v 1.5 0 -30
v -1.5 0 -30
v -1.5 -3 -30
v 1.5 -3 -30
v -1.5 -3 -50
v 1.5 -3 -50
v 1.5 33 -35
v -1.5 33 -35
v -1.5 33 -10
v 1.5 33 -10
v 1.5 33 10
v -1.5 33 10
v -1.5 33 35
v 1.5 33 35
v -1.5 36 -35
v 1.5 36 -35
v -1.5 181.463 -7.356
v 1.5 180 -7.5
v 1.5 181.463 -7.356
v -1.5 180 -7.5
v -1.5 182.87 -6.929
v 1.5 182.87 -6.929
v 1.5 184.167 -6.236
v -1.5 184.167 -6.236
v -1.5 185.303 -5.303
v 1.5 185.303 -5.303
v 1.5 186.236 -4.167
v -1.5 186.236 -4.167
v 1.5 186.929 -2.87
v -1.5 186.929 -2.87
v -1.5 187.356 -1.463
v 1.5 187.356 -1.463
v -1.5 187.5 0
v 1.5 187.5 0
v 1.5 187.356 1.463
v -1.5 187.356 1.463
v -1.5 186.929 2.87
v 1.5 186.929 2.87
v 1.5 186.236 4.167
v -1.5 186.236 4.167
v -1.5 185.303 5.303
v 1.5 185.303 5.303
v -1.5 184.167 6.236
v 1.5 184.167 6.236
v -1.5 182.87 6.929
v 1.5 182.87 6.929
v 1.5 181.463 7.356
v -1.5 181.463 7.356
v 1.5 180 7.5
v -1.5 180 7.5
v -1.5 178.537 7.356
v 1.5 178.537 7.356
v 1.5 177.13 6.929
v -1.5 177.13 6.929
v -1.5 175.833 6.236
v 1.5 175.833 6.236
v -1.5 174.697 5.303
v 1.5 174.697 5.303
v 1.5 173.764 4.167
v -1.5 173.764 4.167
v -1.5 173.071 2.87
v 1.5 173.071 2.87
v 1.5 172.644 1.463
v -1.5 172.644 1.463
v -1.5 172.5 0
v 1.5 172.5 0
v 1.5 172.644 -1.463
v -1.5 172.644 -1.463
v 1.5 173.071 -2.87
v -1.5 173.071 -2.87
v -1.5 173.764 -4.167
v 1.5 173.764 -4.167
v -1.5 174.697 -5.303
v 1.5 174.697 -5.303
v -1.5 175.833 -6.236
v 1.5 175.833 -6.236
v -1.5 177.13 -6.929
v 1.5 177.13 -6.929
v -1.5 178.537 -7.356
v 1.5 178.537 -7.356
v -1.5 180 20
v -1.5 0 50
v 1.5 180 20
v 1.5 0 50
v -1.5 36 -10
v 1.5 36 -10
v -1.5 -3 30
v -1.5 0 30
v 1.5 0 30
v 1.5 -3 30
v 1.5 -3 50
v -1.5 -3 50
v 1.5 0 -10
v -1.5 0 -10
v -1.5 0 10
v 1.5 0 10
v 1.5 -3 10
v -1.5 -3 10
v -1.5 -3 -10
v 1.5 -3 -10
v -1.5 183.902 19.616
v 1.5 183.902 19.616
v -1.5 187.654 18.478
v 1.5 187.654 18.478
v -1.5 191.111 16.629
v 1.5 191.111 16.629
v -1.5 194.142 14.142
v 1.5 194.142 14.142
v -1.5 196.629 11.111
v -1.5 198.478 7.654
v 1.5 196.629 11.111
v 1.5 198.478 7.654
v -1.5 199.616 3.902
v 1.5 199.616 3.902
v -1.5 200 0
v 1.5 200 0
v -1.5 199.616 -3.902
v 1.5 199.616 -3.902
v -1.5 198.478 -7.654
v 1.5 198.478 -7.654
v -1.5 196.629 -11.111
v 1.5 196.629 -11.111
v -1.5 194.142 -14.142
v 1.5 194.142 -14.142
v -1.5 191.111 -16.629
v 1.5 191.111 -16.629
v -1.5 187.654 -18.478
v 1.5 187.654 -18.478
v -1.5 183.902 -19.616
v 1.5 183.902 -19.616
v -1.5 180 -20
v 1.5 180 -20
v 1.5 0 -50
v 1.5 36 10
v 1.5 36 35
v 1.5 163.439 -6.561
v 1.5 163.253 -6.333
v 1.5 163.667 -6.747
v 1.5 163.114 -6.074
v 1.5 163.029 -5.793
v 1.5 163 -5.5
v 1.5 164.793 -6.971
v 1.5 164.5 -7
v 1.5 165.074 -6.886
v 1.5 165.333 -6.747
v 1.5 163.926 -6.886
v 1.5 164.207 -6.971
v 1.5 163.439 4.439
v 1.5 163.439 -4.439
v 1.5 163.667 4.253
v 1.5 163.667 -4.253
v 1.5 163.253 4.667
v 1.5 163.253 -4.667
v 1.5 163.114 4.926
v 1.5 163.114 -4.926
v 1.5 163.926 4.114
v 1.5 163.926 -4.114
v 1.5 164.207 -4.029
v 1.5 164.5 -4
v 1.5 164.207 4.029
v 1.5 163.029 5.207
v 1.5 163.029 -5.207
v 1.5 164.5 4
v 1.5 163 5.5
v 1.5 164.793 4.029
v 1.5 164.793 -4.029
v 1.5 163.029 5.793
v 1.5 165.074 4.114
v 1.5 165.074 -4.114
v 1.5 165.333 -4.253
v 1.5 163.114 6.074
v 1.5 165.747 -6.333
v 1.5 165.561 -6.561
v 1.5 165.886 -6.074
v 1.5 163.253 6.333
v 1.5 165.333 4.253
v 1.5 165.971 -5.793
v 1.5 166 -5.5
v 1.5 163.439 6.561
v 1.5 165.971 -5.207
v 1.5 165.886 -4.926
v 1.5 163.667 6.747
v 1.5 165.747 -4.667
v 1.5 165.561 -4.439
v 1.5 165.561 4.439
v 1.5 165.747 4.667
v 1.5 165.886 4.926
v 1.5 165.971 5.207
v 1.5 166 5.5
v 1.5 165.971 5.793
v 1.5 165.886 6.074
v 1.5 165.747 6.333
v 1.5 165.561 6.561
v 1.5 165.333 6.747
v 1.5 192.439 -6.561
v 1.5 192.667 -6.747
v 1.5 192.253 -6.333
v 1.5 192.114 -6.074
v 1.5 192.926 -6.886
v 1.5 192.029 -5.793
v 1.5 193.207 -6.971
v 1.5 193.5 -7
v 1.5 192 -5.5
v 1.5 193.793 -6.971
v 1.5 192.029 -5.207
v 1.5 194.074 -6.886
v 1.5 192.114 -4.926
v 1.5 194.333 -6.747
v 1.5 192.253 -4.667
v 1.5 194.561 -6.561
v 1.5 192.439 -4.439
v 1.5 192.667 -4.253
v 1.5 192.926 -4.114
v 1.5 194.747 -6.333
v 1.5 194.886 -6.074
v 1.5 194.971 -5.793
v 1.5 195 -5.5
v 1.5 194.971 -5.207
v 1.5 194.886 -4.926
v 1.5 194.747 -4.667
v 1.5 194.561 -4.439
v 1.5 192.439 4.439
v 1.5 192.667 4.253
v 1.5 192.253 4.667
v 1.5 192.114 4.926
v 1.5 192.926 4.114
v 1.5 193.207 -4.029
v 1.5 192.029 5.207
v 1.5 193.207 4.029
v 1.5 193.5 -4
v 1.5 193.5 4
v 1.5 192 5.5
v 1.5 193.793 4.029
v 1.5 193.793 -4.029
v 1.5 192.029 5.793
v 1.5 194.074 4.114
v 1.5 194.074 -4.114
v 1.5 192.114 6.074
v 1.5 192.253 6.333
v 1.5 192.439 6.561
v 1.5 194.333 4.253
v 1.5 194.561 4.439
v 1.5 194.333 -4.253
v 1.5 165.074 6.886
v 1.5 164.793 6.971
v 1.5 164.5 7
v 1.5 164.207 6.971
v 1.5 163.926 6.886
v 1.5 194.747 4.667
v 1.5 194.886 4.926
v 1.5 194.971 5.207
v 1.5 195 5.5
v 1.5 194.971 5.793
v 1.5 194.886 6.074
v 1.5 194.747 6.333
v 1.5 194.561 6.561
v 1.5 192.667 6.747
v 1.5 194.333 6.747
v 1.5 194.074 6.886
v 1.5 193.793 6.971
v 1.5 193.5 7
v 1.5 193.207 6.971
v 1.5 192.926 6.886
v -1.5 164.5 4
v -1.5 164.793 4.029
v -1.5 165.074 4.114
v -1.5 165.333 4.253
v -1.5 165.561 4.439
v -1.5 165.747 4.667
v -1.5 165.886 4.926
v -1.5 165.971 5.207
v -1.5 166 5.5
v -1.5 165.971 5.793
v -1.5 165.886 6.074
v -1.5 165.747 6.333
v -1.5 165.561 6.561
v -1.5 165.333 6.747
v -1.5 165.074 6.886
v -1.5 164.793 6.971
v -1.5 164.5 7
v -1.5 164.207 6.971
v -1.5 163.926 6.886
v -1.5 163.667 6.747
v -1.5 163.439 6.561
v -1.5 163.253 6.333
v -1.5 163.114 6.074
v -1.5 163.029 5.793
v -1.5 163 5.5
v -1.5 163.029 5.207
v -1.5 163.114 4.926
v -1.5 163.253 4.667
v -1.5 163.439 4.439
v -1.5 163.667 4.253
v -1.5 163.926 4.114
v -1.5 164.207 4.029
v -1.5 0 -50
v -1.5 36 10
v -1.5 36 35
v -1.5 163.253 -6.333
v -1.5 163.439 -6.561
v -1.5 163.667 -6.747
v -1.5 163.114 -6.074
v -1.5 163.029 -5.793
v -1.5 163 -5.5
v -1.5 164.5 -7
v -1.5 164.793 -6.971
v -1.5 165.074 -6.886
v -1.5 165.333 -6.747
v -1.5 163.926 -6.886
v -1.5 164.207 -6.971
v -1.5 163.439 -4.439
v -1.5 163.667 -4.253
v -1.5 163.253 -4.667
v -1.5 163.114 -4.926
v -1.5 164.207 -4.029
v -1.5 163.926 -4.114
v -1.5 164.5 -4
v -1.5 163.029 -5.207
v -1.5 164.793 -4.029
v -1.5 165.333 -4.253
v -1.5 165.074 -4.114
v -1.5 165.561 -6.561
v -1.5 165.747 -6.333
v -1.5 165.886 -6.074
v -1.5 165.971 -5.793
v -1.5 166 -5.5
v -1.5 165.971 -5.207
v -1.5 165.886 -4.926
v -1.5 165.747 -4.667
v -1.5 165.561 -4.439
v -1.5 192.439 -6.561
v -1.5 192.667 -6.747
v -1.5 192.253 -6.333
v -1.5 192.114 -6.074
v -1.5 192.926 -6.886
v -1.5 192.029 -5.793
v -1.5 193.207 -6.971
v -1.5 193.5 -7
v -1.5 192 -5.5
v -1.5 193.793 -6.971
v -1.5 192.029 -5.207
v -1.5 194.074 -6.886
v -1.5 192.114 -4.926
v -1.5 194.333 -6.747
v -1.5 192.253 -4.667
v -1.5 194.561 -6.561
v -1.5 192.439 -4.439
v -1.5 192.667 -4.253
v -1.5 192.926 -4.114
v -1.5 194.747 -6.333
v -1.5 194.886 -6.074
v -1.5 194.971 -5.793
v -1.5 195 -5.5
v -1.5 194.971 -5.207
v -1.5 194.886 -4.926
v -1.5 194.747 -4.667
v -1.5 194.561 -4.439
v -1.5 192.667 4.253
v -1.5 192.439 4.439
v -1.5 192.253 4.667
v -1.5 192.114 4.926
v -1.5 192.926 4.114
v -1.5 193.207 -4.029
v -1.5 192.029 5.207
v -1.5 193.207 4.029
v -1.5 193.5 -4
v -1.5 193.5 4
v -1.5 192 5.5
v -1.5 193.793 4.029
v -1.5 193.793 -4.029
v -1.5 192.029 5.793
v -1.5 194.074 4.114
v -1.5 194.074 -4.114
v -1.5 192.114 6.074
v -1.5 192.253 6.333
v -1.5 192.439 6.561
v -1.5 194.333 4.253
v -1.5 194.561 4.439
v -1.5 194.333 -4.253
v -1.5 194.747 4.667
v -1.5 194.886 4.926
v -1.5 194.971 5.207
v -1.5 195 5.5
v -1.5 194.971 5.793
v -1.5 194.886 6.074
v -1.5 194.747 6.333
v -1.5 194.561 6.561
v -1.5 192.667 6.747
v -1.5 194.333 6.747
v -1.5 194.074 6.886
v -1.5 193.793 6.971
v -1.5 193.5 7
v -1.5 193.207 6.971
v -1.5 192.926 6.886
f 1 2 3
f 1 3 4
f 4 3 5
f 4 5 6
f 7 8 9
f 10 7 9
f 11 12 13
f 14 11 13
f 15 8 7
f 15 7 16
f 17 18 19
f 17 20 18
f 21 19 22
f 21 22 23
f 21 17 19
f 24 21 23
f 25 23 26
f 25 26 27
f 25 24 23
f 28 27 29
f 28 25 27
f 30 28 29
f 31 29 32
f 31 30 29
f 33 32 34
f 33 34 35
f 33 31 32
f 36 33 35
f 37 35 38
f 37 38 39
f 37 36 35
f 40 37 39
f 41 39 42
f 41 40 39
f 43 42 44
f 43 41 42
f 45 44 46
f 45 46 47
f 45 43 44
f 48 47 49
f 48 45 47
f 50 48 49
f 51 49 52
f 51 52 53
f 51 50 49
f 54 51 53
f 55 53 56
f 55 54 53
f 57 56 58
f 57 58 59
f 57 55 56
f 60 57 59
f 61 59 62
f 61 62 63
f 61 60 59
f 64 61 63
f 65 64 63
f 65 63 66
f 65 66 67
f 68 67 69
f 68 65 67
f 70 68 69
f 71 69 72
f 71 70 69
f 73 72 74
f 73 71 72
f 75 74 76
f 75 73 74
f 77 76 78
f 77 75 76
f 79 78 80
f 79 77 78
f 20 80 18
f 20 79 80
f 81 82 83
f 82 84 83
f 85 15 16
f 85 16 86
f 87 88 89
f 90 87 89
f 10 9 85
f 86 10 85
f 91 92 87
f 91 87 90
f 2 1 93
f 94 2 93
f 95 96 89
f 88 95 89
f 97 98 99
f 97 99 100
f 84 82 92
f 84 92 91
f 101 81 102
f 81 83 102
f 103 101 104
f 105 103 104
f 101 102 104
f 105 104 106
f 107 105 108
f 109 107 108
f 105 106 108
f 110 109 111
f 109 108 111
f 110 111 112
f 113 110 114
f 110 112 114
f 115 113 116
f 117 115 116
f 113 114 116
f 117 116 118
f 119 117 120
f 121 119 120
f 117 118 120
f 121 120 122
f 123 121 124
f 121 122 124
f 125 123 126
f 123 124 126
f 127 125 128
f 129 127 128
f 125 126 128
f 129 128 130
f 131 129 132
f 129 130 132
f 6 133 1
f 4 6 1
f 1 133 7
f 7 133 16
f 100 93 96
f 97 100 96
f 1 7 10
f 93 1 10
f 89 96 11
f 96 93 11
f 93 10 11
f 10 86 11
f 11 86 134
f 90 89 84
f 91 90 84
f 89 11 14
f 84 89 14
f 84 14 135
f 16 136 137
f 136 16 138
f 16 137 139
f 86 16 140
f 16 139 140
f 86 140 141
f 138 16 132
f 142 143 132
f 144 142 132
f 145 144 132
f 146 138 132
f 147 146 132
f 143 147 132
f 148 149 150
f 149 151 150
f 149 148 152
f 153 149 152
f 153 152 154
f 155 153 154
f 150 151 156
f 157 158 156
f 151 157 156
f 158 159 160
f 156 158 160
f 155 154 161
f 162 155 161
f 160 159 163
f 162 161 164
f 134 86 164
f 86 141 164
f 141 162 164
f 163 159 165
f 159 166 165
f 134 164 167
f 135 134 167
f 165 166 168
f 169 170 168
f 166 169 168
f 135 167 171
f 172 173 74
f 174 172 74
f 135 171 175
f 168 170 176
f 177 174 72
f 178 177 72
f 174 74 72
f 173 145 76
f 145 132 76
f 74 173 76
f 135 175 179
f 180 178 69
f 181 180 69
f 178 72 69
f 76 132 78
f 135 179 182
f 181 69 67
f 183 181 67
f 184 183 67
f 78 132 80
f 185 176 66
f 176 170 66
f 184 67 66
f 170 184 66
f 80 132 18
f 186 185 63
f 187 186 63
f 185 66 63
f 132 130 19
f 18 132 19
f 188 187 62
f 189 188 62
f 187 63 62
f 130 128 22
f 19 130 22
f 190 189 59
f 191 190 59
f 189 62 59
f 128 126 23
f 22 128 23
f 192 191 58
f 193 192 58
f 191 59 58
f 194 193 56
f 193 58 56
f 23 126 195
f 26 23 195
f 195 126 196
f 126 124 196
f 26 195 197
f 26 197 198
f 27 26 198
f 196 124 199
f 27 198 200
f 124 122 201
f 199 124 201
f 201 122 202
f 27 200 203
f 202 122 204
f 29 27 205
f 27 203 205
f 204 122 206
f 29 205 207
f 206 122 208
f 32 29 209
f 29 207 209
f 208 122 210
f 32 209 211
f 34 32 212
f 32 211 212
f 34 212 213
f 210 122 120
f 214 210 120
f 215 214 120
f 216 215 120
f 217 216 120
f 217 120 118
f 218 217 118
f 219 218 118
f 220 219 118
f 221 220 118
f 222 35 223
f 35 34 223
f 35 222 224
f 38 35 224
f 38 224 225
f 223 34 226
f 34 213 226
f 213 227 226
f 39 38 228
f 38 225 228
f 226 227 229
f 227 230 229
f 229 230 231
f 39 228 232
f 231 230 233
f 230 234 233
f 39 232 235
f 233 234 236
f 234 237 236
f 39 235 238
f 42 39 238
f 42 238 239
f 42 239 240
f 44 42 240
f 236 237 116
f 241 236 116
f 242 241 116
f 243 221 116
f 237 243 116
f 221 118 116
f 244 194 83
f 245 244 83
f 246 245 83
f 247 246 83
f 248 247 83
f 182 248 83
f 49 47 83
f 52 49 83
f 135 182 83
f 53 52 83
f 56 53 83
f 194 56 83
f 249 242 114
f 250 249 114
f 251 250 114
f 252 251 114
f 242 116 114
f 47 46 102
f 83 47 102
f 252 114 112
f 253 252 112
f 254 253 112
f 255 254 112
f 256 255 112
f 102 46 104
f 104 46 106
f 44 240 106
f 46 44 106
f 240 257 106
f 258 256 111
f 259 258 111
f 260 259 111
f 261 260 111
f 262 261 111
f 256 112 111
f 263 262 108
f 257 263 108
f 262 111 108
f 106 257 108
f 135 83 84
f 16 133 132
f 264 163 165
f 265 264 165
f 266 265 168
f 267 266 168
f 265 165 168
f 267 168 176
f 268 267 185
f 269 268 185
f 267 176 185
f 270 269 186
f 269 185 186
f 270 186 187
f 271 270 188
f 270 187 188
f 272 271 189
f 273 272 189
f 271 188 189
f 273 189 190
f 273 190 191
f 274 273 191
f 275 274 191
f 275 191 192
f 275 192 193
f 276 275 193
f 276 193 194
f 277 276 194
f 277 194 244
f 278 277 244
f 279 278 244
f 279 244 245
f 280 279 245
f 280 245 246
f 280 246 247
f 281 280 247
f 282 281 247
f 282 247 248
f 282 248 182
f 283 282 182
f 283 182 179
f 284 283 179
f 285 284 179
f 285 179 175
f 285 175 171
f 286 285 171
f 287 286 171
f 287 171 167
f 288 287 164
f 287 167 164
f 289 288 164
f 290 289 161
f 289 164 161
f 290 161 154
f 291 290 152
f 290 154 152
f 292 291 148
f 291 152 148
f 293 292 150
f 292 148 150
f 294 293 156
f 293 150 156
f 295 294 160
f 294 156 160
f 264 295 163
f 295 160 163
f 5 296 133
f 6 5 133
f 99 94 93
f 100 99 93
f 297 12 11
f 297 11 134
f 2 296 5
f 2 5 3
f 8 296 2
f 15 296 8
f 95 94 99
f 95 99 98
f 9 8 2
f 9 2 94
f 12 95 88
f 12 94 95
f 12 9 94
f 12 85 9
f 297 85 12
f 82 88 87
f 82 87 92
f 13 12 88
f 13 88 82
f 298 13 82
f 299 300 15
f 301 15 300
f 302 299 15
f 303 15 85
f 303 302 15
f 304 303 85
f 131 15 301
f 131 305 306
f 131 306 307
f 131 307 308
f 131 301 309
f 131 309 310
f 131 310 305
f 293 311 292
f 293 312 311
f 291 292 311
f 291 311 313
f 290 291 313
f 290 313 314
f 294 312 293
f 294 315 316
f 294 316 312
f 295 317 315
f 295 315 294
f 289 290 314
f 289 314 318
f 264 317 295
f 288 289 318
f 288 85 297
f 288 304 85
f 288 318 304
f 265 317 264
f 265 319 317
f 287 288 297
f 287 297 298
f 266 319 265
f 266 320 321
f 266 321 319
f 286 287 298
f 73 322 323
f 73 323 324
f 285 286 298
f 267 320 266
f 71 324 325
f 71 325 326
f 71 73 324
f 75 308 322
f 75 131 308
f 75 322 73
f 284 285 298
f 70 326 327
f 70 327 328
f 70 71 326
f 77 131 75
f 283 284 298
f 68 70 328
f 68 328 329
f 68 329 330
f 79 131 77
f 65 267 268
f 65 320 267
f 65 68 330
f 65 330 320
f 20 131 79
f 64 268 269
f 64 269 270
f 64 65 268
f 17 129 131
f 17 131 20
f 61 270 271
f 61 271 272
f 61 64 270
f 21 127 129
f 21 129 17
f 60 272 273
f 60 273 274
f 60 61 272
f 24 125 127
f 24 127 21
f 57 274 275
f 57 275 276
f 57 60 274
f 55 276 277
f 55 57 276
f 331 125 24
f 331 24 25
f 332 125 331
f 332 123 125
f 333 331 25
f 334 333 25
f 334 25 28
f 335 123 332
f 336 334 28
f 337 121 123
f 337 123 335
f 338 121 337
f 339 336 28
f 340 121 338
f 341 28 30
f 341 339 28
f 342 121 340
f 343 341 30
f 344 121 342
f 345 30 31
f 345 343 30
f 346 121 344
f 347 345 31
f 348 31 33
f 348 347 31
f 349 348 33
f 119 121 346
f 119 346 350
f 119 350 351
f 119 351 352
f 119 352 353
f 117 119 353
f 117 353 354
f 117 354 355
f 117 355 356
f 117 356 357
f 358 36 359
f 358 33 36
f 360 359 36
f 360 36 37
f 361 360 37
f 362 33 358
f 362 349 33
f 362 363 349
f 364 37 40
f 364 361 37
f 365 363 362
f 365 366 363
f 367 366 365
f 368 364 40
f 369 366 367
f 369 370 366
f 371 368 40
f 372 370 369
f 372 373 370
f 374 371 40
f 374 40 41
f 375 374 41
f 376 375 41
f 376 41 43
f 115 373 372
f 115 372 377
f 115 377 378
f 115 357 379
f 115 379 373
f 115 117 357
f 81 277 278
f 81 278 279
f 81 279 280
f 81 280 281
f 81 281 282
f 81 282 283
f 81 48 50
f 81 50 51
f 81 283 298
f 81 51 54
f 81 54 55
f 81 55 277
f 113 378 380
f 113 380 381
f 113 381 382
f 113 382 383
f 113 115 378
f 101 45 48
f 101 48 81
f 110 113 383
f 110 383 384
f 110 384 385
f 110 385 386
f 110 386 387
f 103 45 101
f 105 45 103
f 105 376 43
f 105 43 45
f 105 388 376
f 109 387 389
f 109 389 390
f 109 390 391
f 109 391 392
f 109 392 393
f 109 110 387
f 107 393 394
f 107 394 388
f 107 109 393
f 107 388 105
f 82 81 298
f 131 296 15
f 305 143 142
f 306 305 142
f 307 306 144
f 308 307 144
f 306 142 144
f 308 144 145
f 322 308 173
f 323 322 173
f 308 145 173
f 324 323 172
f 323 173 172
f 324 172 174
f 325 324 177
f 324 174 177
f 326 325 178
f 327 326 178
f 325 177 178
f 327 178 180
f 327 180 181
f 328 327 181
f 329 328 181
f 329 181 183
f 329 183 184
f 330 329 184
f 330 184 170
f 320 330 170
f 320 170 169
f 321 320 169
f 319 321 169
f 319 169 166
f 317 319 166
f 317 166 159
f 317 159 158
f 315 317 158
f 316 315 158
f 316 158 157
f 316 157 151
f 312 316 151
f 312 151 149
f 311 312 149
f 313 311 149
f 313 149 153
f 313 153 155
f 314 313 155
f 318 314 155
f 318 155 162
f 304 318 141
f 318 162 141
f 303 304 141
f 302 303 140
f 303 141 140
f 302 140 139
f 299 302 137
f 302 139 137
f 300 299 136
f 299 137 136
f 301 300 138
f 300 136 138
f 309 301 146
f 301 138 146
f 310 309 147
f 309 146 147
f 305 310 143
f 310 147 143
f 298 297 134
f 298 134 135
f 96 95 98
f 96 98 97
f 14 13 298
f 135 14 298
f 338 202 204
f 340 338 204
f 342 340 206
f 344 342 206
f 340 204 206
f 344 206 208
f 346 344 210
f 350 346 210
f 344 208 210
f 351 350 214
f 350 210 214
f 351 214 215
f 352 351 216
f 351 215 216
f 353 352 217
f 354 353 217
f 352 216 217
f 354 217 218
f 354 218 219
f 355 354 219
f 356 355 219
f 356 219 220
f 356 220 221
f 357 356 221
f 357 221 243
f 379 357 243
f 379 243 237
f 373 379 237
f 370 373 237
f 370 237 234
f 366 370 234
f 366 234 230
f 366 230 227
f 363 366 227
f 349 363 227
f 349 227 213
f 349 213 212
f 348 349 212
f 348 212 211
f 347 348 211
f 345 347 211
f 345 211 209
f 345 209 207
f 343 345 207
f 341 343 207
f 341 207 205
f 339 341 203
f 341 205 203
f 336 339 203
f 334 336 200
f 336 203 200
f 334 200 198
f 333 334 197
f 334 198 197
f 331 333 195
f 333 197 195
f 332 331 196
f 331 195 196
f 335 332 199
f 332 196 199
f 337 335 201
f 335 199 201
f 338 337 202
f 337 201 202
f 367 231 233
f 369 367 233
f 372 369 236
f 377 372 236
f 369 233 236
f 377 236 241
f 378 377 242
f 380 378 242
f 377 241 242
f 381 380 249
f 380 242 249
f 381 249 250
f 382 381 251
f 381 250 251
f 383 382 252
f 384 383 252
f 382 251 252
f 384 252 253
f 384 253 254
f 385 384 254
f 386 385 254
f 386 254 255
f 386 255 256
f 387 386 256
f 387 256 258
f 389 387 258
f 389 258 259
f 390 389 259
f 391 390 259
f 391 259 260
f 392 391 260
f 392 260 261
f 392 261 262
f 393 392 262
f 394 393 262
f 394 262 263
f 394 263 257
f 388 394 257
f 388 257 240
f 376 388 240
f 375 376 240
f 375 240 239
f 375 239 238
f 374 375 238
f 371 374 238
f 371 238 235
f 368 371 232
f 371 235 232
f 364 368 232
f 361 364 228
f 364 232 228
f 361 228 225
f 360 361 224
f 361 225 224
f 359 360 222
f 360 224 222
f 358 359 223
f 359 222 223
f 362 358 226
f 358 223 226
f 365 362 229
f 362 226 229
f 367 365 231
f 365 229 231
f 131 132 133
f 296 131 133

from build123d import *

# Parameters (mm, degrees)
SKETCH2_R           = 7.5
BOSS_EXTRUDE1_DEPTH = 1.5
SKETCH3_W           = 25
SKETCH3_H           = 3
CUT_EXTRUDE1_DEPTH  = 4
SKETCH4_W           = 3
SKETCH4_H           = 20
BOSS_EXTRUDE2_DEPTH = 3
SKETCH5_R           = 1.5
CUT_EXTRUDE2_DEPTH  = 10


with BuildPart() as part:
    # Sketch2 → Boss-Extrude1 (new, symmetric)
    with BuildSketch(Plane(origin=(0, 0, 0), x_dir=(0, 0, -1), z_dir=(1, 0, 0))):
        with BuildLine():
            Line((50, 0), (-50, 0))
            Line((-50, 0), (-20, 180))
            ThreePointArc((-20, 180), (0, 200), (20, 180))
            Line((20, 180), (50, 0))
        make_face()
        with Locations((0, 180)):
            Circle(SKETCH2_R, mode=Mode.SUBTRACT)
    extrude(amount=BOSS_EXTRUDE1_DEPTH, both=True)

    # Sketch3 → Cut-Extrude1 (cut)
    with BuildSketch(Plane.ZY.offset(1.5)):
        with Locations((22.5, 34.5)):
            Rectangle(SKETCH3_W, SKETCH3_H)
        with Locations((-22.5, 34.5)):
            Rectangle(SKETCH3_W, SKETCH3_H)
    extrude(amount=-CUT_EXTRUDE1_DEPTH, mode=Mode.SUBTRACT)

    # Sketch4 → Boss-Extrude2 (add)
    with BuildSketch(Plane.XZ):
        Rectangle(SKETCH4_W, SKETCH4_H)
        with Locations((0, -40)):
            Rectangle(SKETCH4_W, SKETCH4_H)
        with Locations((0, 40)):
            Rectangle(SKETCH4_W, SKETCH4_H)
    extrude(amount=BOSS_EXTRUDE2_DEPTH)

    # Sketch5 → Cut-Extrude2 (cut)
    with BuildSketch(Plane(origin=(1.5, 0, 0), x_dir=(0, 0, -1), z_dir=(1, 0, 0))):
        with Locations((-5.5, 193.5)):
            Circle(SKETCH5_R)
        with Locations((-5.5, 164.5)):
            Circle(SKETCH5_R)
        with Locations((5.5, 164.5)):
            Circle(SKETCH5_R)
        with Locations((5.5, 193.5)):
            Circle(SKETCH5_R)
    extrude(amount=-CUT_EXTRUDE2_DEPTH, mode=Mode.SUBTRACT)


solid = part.part
